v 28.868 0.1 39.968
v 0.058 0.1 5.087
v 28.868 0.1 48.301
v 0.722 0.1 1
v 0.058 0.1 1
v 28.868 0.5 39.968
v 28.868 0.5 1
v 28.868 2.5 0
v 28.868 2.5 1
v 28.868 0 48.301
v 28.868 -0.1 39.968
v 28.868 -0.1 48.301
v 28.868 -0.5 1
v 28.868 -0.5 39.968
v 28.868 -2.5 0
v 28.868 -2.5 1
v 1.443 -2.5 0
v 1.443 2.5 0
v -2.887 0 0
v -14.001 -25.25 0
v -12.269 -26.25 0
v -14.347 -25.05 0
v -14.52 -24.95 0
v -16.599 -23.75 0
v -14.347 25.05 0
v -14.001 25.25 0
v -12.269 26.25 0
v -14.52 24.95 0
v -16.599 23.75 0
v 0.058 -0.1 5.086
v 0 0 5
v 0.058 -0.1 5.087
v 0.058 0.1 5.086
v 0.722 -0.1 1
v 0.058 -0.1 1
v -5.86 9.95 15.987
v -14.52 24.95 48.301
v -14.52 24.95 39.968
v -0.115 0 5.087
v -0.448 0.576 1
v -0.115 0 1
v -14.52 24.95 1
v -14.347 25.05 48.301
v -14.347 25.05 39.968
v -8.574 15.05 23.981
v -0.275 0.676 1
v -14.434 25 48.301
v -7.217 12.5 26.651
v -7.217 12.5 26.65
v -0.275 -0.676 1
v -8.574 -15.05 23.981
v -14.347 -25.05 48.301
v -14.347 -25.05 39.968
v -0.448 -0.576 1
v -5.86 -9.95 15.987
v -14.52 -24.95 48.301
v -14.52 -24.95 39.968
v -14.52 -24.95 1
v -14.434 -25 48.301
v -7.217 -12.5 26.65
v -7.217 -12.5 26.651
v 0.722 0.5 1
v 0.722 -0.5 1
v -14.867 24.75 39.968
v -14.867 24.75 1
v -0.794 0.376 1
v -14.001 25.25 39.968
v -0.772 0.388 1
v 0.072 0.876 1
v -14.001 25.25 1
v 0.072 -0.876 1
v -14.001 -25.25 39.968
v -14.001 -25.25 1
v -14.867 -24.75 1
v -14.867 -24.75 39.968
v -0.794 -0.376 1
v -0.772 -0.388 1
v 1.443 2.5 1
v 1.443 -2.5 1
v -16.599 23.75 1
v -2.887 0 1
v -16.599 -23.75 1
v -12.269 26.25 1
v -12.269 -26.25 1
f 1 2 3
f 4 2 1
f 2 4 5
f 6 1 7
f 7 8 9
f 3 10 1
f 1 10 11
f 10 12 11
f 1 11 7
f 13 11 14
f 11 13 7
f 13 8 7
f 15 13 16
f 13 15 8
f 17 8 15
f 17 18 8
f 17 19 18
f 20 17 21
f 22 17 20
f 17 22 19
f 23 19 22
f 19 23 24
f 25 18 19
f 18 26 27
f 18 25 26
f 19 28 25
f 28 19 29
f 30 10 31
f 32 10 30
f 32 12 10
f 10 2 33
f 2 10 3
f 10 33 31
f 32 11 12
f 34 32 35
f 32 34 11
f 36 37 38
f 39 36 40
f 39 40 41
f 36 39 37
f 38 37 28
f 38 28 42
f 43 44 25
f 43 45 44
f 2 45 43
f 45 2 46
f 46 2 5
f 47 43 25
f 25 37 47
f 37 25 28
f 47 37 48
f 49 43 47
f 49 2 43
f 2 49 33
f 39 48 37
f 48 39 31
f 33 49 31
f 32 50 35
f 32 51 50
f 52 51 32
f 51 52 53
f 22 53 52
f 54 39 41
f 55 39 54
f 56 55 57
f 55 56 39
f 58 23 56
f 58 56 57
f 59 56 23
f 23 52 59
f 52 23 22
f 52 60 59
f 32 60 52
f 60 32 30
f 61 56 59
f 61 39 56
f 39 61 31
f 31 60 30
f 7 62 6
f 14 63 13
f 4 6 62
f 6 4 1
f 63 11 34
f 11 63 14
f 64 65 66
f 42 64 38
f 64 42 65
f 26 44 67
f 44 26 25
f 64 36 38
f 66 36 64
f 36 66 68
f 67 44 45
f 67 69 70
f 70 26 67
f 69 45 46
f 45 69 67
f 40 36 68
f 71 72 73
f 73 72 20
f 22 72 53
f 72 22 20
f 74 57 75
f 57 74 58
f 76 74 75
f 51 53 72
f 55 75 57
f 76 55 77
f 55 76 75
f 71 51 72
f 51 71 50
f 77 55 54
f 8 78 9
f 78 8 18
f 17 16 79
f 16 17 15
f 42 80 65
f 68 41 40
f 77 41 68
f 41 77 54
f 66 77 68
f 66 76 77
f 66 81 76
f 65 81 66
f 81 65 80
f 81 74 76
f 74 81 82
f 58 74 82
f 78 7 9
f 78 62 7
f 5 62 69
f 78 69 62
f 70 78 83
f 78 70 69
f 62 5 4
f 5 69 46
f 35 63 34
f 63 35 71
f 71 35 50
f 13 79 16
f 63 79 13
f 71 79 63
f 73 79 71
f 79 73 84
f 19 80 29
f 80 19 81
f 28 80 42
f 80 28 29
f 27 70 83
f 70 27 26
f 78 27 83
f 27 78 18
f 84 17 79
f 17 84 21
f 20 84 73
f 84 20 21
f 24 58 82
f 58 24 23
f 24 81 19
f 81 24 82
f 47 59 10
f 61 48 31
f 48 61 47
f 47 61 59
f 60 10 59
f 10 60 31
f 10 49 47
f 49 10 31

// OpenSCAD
die_color = "purple";
support_color = "#EFEFEF";

tetrahedron(50, 5);

module tetrahedron(length, support_offset = 0) {
 height = triangle_height(length);

 color(die_color) 
   translate([0, 0, height + support_offset]) 
    rotate([0, 180, 30]) 
      translate([-length/2, -height/3, 0])
        polyhedron(
          points = [
            [0, 0, 0], // base
            [length, 0, 0],
            [length/2, height, 0],
            [length/2, height/3, height]
          ],
          faces = [
            [0, 1, 2], // base
            [0, 2, 3], // left face
            [1, 3, 2], // right face
            [0, 3, 1]  // front face
          ]
        );
  
  if (support_offset > 0)
    tetrahedron_supports(length, height, support_offset);
}

module tetrahedron_support(length, height, depth, support_offset = 0) {
  
  midpoint = triangle_midpoint(length);
  
  points = [
      [0, 0],                               // lower left
      [0, support_offset],                  // upper left
      [midpoint, height + support_offset],  // upper right 
      [midpoint, 0]                         // lower right
  ];

  color(support_color) 
    rotate([90, 0, 0]) 
      linear_extrude(height=depth, center = true) 
        polygon(points = points);
}


module tetrahedron_base(length, height, width) {
  
  midpoint = triangle_midpoint(length);
  
  points = [
      [0, 0],         // lower left
      [0, 1],         // upper left
      [midpoint, 1],  // upper right 
      [midpoint, 0]   // lower right
  ];

  color(support_color) 
    rotate([90, 0, 0]) 
      linear_extrude(height = width, center = true) 
        polygon(points = points);
}


module tetrahedron_supports(length, height, support_offset) {
  // thin support that touches the die
  rotate([0, 0, 0]) tetrahedron_support(length, height, 0.2, support_offset);
  rotate([0, 0, 120]) tetrahedron_support(length, height, 0.2, support_offset);
  rotate([0, 0, 240]) tetrahedron_support(length, height, 0.2, support_offset);

  // thicker support added for stability
  offset_height = height - 2 * support_offset / 3;
  rotate([0, 0, 0]) tetrahedron_support(length, offset_height, 1, 0);
  rotate([0, 0, 120]) tetrahedron_support(length, offset_height, 1, 0);
  rotate([0, 0, 240]) tetrahedron_support(length, offset_height, 1, 0);
  
  // support raft that sits on the bed
  rotate([0, 0, 0]) tetrahedron_base(length, height, support_offset);
  rotate([0, 0, 120]) tetrahedron_base(length, height, support_offset);
  rotate([0, 0, 240]) tetrahedron_base(length, height, support_offset);  
}

function triangle_height(edge_length) = edge_length * sqrt(3) / 2;
function triangle_midpoint(edge_length) = edge_length * sqrt(3) / 3;
